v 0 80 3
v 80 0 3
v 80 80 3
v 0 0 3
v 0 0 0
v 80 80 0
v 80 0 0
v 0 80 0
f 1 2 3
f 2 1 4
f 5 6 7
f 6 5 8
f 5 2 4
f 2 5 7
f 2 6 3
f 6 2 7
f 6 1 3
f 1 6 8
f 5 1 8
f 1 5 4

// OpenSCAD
/*
Title: Scaffold - Kepler Area Sweep Template
Folder: 14_gravitation_orbits
Physics Topic: Planned extension
Difficulty: Scaffold
Print Type: FDM
Teaches: Future concept module
Use Case: Planned classroom extension
*/

// --------------------
// Parameters
// --------------------
base_size = 80;
thickness = 3;

module scaffold_placeholder(){
    cube([base_size,base_size,thickness]);
}

// --------------------
// Physics Meaning
// --------------------
// Scaffold file with geometry placeholder and planned educational direction.

// --------------------
// Learning Notes
// --------------------
// TODO: add activity prompts and comparative parameter sweeps.

// --------------------
// Print Notes
// --------------------
// TODO: finalize orientation and durability tuning.

// --------------------
// Customization Ideas
// --------------------
// TODO: convert placeholder to fully featured model in roadmap sequence.

scaffold_placeholder();
